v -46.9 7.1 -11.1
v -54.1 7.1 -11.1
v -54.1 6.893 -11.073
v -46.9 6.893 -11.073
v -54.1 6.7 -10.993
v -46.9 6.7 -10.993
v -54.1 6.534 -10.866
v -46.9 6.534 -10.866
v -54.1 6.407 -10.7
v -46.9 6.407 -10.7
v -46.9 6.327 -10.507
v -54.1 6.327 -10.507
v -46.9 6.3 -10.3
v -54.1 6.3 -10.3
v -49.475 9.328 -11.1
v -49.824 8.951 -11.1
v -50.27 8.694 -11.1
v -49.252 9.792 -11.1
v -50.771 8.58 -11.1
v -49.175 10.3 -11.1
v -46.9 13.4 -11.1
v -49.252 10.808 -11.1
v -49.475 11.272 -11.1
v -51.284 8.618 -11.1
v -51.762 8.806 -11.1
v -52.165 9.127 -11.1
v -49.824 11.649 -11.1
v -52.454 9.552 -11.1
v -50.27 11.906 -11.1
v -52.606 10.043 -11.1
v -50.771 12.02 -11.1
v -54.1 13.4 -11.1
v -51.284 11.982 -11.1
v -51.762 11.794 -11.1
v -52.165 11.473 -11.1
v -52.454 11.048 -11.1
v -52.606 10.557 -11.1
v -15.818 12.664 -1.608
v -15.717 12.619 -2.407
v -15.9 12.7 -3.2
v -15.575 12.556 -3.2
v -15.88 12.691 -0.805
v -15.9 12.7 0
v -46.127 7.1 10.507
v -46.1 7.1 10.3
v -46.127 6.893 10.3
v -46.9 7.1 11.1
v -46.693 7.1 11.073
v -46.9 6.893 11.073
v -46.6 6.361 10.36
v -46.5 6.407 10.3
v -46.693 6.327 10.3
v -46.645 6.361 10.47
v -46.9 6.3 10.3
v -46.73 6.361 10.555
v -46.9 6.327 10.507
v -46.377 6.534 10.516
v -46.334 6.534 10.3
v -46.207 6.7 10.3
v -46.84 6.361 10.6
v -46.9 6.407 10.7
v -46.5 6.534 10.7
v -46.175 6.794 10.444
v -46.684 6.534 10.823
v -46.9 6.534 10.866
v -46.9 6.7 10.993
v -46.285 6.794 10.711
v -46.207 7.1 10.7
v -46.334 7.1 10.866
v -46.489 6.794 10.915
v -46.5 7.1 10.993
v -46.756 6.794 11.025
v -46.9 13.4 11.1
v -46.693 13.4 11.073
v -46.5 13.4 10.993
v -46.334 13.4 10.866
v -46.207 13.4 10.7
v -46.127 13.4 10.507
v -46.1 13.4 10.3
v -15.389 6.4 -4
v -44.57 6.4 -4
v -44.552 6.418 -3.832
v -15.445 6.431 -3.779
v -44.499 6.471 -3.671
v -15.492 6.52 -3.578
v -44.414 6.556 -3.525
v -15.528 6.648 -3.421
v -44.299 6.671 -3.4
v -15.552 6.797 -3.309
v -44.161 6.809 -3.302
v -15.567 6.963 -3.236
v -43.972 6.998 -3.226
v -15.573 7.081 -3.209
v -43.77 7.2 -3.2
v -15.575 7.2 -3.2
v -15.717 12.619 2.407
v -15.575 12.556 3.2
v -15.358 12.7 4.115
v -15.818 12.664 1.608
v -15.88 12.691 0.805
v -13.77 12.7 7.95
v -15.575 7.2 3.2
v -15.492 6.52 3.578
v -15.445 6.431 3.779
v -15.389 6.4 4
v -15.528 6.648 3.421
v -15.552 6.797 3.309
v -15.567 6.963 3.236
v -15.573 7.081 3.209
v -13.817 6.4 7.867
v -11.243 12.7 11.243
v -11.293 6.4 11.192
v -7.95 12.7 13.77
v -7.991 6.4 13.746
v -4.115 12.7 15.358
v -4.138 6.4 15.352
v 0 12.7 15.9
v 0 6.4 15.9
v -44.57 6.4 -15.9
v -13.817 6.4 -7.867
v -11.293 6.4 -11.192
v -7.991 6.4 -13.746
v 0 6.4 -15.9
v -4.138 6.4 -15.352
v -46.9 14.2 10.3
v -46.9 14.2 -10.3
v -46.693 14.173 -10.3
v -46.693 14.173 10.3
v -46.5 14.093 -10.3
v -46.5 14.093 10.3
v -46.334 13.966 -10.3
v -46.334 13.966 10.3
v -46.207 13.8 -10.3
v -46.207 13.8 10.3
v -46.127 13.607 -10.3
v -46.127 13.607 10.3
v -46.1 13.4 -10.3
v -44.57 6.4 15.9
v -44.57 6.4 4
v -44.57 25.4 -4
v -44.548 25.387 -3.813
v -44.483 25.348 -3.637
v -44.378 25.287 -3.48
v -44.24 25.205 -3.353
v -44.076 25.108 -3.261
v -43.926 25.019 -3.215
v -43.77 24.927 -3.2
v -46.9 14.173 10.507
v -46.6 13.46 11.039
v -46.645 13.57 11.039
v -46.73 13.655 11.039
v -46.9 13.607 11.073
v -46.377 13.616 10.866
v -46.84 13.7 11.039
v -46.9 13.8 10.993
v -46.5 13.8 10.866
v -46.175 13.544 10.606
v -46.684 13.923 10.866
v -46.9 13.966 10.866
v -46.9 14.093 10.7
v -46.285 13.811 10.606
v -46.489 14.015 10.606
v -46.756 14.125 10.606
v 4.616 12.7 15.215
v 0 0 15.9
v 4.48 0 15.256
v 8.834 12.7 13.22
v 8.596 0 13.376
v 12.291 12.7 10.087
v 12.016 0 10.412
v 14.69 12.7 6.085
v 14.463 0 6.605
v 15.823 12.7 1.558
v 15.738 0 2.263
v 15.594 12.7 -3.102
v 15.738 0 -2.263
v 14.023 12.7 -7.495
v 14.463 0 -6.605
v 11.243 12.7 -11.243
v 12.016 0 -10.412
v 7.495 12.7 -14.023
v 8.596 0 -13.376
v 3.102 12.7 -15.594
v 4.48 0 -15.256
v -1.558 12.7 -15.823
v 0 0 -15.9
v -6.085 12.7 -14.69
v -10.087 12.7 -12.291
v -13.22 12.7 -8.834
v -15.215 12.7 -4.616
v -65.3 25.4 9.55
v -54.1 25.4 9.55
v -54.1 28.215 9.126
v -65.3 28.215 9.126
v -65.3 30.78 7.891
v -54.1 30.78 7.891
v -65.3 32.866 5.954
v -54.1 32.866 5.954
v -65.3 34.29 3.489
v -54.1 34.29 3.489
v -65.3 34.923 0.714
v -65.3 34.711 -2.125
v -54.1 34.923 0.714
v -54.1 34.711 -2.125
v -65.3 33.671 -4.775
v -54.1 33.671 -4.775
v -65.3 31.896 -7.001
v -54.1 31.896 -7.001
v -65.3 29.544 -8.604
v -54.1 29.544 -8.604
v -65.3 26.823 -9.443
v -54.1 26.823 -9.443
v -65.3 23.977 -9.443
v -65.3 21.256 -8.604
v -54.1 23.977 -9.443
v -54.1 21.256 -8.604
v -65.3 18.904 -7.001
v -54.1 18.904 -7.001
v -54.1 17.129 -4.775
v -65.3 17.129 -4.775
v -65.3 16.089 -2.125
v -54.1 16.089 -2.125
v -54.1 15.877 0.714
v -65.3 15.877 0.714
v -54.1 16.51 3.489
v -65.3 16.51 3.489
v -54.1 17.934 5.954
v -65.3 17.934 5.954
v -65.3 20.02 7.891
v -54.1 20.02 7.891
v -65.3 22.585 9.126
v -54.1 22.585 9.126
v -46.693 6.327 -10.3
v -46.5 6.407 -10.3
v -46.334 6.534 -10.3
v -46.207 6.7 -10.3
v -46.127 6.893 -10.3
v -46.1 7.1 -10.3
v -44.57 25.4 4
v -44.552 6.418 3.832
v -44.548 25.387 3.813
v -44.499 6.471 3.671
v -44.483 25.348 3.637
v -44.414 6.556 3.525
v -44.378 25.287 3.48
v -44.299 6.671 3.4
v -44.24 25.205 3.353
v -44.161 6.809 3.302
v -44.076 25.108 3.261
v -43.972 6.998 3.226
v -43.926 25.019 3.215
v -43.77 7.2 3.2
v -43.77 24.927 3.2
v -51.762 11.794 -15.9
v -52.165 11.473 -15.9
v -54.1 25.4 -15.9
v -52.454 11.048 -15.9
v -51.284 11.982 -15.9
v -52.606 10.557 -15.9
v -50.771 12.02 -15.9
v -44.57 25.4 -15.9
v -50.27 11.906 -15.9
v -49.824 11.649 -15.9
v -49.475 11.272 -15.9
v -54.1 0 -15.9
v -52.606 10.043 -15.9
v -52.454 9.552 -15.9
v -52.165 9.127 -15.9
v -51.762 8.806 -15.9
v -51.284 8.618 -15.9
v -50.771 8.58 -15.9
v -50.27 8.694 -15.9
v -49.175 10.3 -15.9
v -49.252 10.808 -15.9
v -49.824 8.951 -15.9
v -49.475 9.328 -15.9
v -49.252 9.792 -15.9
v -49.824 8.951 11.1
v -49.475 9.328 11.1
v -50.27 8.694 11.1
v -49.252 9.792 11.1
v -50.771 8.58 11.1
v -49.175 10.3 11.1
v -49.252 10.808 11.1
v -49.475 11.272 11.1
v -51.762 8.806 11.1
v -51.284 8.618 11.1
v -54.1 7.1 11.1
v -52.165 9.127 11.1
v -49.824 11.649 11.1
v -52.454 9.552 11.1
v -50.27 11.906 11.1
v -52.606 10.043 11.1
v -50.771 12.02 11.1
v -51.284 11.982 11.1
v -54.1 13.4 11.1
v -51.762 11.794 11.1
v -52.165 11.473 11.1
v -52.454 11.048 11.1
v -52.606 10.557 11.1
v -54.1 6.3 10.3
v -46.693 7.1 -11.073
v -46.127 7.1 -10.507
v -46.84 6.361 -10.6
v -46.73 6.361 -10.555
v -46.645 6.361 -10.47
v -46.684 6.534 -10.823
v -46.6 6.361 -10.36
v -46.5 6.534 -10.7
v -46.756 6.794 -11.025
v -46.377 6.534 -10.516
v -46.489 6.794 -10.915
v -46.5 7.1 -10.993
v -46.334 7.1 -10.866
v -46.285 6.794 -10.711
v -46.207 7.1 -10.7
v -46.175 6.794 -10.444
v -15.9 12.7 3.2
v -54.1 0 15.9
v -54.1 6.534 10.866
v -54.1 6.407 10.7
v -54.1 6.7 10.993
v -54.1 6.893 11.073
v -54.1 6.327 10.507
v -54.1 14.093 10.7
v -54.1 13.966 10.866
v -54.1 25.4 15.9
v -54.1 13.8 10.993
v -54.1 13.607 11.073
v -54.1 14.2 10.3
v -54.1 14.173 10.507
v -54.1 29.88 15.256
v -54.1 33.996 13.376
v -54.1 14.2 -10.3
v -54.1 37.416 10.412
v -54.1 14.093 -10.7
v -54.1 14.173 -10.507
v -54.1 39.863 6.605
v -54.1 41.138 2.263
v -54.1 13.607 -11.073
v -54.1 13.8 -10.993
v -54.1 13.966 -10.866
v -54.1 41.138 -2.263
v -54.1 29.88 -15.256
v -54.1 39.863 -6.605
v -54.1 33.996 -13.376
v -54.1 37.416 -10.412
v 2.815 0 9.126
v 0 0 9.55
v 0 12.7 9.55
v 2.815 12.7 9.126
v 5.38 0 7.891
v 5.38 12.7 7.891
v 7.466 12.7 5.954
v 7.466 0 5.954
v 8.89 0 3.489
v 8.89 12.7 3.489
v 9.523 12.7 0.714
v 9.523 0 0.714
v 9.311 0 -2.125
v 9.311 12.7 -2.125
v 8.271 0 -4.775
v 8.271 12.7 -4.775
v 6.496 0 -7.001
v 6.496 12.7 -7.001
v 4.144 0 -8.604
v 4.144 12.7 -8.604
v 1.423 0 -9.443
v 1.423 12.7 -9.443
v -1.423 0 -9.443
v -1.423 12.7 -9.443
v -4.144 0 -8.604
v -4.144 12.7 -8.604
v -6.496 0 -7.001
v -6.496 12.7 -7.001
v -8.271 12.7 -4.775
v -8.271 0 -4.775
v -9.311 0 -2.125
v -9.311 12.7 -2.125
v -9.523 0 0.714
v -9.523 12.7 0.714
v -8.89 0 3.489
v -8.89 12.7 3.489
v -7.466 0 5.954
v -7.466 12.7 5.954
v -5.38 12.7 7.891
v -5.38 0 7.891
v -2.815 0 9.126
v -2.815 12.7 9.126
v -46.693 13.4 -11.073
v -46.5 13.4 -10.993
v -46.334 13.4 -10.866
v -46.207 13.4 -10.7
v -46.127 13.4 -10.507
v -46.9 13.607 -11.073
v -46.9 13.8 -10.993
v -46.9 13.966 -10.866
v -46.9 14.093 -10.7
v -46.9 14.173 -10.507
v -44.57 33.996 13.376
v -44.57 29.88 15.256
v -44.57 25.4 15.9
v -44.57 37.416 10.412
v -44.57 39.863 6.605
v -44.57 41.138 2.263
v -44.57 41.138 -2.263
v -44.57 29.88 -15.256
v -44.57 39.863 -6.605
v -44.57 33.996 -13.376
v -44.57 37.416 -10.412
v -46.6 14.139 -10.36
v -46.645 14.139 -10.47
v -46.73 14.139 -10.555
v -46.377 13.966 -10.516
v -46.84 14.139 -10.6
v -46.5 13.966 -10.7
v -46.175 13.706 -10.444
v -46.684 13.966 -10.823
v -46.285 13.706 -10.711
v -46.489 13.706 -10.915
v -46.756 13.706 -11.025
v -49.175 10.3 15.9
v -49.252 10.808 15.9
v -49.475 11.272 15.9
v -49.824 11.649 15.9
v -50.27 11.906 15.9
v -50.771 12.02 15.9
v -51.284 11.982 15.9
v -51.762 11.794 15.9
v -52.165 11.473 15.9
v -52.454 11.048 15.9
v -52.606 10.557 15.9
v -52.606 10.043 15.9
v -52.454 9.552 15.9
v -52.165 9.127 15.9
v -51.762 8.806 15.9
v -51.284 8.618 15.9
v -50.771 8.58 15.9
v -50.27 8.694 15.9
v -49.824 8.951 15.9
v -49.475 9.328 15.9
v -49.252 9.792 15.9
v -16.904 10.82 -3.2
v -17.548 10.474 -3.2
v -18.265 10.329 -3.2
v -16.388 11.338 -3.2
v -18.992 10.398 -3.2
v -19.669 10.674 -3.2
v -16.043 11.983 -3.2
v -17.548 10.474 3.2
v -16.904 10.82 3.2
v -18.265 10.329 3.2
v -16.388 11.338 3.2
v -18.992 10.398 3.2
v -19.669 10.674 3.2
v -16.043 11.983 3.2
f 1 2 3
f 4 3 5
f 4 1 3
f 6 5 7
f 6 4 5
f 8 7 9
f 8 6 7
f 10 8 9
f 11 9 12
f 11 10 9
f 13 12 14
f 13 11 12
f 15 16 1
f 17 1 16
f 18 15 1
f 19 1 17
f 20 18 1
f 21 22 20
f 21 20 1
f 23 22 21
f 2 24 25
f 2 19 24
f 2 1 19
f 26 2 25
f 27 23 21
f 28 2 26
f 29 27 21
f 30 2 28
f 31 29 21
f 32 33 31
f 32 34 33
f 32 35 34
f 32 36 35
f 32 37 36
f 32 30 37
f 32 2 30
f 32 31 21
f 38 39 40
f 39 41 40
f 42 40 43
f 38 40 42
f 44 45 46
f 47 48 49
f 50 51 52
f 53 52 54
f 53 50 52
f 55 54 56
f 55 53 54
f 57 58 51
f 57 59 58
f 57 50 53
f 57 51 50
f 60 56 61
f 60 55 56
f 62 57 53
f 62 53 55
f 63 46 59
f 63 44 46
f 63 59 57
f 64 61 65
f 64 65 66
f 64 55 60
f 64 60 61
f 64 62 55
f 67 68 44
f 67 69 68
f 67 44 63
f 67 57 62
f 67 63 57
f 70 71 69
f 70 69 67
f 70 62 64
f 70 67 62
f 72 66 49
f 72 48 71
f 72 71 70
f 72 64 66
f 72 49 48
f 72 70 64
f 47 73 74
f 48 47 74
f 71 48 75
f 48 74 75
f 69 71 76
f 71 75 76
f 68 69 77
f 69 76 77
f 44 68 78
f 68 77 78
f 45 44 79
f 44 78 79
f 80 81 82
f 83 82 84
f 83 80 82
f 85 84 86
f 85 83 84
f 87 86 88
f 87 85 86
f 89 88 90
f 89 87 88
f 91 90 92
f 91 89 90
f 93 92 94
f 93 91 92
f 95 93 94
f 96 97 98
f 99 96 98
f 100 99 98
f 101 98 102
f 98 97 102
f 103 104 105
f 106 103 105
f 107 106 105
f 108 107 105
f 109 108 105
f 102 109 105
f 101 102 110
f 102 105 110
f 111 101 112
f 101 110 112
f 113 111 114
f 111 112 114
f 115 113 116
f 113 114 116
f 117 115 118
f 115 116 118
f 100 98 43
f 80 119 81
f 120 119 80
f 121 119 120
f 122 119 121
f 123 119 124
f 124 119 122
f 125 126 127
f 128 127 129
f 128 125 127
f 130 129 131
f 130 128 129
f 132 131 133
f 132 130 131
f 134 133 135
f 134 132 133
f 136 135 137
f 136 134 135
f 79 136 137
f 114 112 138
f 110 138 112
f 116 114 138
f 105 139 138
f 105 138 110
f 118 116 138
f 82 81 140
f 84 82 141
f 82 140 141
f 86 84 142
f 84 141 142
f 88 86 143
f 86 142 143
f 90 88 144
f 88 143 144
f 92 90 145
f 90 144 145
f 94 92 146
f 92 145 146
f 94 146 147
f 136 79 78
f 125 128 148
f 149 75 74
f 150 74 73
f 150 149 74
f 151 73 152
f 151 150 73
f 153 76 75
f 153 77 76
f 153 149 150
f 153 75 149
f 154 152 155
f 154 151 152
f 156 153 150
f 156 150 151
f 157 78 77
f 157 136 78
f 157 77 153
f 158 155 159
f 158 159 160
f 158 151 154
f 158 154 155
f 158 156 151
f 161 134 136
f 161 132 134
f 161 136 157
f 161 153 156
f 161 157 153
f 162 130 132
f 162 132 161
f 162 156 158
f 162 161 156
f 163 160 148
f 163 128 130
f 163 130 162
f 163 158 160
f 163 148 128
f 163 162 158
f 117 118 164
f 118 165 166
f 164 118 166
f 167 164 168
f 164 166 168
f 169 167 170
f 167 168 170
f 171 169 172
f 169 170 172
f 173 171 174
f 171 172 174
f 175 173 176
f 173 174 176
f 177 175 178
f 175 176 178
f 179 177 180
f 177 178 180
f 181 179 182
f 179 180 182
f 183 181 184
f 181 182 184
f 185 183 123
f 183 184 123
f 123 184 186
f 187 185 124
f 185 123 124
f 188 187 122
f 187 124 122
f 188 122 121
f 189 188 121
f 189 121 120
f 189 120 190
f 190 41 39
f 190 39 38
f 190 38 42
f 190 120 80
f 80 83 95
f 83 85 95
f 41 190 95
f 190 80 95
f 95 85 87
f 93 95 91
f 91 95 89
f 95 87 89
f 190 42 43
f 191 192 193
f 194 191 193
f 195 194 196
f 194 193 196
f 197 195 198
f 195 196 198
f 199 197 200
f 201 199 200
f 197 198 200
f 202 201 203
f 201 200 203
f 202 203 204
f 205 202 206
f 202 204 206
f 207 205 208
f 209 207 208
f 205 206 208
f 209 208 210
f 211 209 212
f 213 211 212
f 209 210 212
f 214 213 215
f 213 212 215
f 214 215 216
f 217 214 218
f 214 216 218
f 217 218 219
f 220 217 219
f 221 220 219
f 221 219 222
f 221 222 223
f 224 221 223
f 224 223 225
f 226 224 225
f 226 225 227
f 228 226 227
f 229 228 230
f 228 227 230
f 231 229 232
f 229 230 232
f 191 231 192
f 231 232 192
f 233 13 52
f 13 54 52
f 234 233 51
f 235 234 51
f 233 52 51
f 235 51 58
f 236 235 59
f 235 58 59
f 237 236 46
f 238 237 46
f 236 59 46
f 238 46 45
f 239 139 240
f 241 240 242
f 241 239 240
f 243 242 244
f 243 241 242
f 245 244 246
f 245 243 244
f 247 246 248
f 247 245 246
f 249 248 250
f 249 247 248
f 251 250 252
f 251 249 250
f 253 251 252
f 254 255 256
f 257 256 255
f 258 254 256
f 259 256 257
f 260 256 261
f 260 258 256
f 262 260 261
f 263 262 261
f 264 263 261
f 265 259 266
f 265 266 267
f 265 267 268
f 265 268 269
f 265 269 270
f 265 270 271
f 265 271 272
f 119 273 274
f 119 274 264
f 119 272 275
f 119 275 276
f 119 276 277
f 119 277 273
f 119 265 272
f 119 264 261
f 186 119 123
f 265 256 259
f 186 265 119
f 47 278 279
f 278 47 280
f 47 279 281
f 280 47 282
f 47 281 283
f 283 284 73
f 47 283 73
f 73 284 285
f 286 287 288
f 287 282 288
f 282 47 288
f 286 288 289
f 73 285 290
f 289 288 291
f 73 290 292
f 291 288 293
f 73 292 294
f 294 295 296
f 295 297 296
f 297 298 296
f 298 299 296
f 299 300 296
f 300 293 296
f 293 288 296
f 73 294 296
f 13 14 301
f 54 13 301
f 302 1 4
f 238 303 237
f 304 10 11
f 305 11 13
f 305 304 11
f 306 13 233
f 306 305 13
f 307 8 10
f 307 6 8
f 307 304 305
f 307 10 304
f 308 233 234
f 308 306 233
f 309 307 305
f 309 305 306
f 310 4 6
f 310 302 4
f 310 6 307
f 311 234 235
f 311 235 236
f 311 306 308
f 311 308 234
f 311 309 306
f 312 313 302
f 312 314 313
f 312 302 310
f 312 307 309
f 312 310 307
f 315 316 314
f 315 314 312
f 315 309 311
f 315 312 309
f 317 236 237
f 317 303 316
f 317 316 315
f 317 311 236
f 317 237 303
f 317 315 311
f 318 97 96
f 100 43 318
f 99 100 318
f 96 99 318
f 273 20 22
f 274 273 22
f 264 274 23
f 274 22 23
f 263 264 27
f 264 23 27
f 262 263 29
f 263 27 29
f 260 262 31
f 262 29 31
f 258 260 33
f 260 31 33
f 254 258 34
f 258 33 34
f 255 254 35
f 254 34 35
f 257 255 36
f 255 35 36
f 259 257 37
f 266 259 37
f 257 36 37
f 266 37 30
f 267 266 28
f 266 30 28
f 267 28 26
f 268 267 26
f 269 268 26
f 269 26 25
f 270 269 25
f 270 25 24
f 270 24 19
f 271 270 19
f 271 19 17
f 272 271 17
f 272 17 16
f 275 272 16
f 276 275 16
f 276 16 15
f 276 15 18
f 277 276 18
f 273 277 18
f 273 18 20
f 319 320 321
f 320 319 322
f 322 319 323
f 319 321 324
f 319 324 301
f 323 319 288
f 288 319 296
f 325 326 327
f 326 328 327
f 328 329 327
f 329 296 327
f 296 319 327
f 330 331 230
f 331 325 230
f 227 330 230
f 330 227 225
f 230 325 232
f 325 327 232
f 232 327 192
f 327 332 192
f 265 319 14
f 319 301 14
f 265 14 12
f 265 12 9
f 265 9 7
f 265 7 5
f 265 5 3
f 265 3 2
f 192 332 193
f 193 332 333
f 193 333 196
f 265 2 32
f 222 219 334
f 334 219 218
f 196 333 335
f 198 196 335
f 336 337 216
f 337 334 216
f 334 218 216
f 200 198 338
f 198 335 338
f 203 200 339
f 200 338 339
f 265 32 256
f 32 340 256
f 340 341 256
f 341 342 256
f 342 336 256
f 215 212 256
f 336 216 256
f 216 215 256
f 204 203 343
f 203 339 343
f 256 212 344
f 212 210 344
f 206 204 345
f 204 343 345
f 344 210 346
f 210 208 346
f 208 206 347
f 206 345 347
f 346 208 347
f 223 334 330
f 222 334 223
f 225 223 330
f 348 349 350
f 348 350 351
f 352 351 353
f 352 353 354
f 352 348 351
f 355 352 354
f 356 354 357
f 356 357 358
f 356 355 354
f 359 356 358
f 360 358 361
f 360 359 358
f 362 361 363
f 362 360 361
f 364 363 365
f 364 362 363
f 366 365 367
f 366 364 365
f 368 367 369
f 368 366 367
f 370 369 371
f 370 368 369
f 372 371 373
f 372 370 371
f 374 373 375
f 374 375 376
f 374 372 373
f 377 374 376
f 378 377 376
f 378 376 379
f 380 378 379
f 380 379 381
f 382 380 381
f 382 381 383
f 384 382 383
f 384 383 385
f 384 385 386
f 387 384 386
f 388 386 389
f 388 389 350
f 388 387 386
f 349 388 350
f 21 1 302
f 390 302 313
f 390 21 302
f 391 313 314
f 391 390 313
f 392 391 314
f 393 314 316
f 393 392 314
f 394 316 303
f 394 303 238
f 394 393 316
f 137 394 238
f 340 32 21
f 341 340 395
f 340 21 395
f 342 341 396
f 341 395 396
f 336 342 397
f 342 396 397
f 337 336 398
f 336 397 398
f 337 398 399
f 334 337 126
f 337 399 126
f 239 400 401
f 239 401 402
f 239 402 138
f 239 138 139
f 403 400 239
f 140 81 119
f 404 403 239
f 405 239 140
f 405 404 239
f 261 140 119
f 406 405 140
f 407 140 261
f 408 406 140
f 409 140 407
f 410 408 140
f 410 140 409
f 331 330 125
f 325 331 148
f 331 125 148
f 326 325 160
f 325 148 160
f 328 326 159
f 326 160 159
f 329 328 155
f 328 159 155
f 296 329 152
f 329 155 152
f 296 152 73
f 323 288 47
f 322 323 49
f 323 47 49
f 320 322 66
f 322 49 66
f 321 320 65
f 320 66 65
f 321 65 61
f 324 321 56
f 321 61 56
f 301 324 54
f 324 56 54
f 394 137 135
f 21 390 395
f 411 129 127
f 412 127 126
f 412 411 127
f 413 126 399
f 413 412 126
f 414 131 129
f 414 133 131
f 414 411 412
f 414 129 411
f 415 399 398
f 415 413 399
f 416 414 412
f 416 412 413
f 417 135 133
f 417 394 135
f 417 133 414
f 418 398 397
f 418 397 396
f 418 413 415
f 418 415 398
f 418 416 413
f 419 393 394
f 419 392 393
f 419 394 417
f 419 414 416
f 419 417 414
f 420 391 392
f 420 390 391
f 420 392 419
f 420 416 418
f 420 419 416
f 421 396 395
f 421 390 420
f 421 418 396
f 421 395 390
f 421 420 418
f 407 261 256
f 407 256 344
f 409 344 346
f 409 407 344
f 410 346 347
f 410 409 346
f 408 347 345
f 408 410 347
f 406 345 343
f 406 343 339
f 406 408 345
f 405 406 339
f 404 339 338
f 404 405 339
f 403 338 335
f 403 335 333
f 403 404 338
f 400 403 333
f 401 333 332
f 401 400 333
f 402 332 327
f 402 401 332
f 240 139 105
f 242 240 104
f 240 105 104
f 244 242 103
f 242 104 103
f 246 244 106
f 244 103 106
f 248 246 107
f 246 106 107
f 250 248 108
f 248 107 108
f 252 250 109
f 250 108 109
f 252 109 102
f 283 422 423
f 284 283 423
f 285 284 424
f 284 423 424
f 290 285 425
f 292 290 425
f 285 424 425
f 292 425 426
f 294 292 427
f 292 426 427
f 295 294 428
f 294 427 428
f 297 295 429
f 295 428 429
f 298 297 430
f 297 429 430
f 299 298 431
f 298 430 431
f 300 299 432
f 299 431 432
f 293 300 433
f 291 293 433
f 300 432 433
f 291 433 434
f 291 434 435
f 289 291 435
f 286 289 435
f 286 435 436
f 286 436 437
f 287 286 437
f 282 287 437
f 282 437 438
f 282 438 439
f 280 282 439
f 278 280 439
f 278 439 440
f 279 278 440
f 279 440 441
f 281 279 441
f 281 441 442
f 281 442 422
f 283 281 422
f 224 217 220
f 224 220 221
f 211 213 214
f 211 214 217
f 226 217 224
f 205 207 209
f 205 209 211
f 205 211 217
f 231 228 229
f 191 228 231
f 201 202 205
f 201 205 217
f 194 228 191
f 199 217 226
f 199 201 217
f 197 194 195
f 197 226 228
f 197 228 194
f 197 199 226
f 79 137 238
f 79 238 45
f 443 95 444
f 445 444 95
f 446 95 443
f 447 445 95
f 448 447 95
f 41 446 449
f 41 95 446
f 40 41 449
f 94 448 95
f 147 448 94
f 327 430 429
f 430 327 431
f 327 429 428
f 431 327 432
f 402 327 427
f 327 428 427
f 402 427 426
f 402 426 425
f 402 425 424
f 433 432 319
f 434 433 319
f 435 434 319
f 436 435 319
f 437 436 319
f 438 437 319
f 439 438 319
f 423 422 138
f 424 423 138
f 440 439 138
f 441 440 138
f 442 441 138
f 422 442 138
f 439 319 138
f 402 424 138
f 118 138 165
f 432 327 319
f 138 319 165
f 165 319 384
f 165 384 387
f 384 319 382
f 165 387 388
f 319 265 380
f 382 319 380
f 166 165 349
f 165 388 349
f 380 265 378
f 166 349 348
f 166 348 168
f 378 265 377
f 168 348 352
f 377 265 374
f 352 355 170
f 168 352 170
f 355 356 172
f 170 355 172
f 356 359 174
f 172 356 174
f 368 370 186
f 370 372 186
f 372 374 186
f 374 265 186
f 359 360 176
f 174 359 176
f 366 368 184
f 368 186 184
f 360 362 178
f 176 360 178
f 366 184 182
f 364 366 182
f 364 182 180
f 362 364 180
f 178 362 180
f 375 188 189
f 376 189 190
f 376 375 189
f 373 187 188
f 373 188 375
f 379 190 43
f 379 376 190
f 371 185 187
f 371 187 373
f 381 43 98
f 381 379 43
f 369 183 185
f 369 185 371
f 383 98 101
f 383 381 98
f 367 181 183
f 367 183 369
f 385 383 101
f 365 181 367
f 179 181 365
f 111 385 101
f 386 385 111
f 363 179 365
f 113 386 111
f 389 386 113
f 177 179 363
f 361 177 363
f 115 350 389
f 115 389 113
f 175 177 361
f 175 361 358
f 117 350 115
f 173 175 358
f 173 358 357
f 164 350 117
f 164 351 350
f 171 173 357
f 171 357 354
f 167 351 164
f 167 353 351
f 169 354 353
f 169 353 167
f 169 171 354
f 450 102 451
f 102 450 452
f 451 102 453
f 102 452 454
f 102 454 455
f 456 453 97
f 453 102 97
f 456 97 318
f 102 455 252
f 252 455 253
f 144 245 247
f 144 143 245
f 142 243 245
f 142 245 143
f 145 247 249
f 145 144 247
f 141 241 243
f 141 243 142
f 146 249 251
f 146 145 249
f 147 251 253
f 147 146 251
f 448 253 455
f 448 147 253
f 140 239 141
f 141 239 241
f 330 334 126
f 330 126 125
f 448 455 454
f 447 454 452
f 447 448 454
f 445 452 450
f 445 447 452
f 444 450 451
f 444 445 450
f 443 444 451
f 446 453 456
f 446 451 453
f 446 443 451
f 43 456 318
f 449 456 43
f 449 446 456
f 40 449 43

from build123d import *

# Parameters (mm, degrees)
BOSS_EXTRUDE1_DEPTH     = 6.4
SKETCH1_3_R             = 15.9
SKETCH1_3_R_2           = 9.55
BOSS_EXTRUDE2_DEPTH     = 12.7
SKETCH1_4_W             = 9.53
SKETCH1_4_H             = 31.8
BOSS_EXTRUDE3_DEPTH     = 25.4
RIB1_REACH              = 63.845
SKETCH6_WALL_W          = 157.046570884
SKETCH6_WALL_H          = 6.4
CUT_EXTRUDE1_DEPTH      = 62.844805764
CUT_EXTRUDE1_DEPTH_BACK = 62.844805764
BOSS_EXTRUDE10_DEPTH    = 9.53
SKETCH9_R               = 9.55
BOSS_EXTRUDE11_DEPTH    = 11.2
SKETCH10_W              = 22.2
SKETCH10_H              = 7.9
CUT_EXTRUDE2_DEPTH      = 8
SKETCH11_R              = 1.725
CUT_EXTRUDE3_DEPTH      = 84.552498467
FILLET1_R               = 0.8


with BuildPart() as part:
    # Sketch1 → Boss-Extrude1 (new body)
    with BuildSketch(Plane(origin=(0, 0, 0), x_dir=(1, 0, 0), z_dir=(0, 1, 0))):
        with BuildLine():
            ThreePointArc((0, -15.9), (-15.9, 0), (0, 15.9))
            Line((0, 15.9), (-44.57, 15.9))
            Line((-44.57, 15.9), (-44.57, -15.9))
            Line((-44.57, -15.9), (0, -15.9))
        make_face()
    extrude(amount=BOSS_EXTRUDE1_DEPTH)

    # Sketch1<3> → Boss-Extrude2 (add)
    with BuildSketch(Plane(origin=(0, 0, 0), x_dir=(1, 0, 0), z_dir=(0, 1, 0))):
        with Locations(Location((0, 0, 0), (0, 0, 270))):
            Circle(SKETCH1_3_R)
        with Locations(Location((0, 0, 0), (0, 0, 270))):
            Circle(SKETCH1_3_R_2, mode=Mode.SUBTRACT)
    extrude(amount=BOSS_EXTRUDE2_DEPTH)

    # Sketch1<4> → Boss-Extrude3 (add)
    with BuildSketch(Plane(origin=(0, 0, 0), x_dir=(1, 0, 0), z_dir=(0, 1, 0))):
        with Locations((-49.335, 0)):
            Rectangle(SKETCH1_4_W, SKETCH1_4_H)
    extrude(amount=BOSS_EXTRUDE3_DEPTH)

    # Sketch6 wall → Rib1 (add, up to next)
    with BuildSketch(Plane(origin=(-30.235, 19.05, 0), x_dir=(-0.914310589726, 0.405013759662, 0), z_dir=(-0.405013759662, -0.914310589726, 0)), mode=Mode.PRIVATE) as rib1_sk1:
        Rectangle(SKETCH6_WALL_W, SKETCH6_WALL_H)
    rib1_tool1 = extrude(rib1_sk1.sketch, amount=RIB1_REACH, mode=Mode.PRIVATE) - part.part
    add(rib1_tool1.solids().sort_by_distance((-30.235, 19.05, 0))[0])

    # Sketch7 → Cut-Extrude1 (cut, two sides)
    with BuildSketch(Plane.XY) as cut_extrude1_sk:
        with BuildLine():
            Line((-44.57, 25.4), (-19.669441159, 10.673850552))
            ThreePointArc((-19.669441159, 10.673850552), (-17.213195922, 10.623662856), (-15.9, 12.7))
            Line((-15.9, 12.7), (-44.57, 25.4))
        make_face()
    extrude(amount=CUT_EXTRUDE1_DEPTH, mode=Mode.SUBTRACT)
    extrude(cut_extrude1_sk.sketch, amount=-CUT_EXTRUDE1_DEPTH_BACK, mode=Mode.SUBTRACT)

    # Sketch8 → Boss-Extrude10 (add)
    with BuildSketch(Plane(origin=(-44.57, 0, 0), x_dir=(0, 0, -1), z_dir=(1, 0, 0))):
        with BuildLine():
            Line((-15.9, 25.4), (15.9, 25.4))
            ThreePointArc((15.9, 25.4), (0, 41.3), (-15.9, 25.4))
        make_face()
    extrude(amount=-BOSS_EXTRUDE10_DEPTH)

    # Sketch9 → Boss-Extrude11 (add)
    with BuildSketch(Plane.ZY.offset(54.1)):
        with Locations((0, 25.4)):
            Circle(SKETCH9_R)
    extrude(amount=BOSS_EXTRUDE11_DEPTH)

    # Sketch10 → Cut-Extrude2 (cut)
    with BuildSketch(Plane.ZY.offset(54.1)):
        with Locations((0, 10.25)):
            Rectangle(SKETCH10_W, SKETCH10_H)
    extrude(amount=-CUT_EXTRUDE2_DEPTH, mode=Mode.SUBTRACT)

    # Sketch11 → Cut-Extrude3 (cut, through all)
    with BuildSketch(Plane.XY.offset(15.9)):
        with Locations((-50.9, 10.3)):
            Circle(SKETCH11_R)
    extrude(amount=-CUT_EXTRUDE3_DEPTH, mode=Mode.SUBTRACT)

    # Fillet1
    fillet1_edges = [part.edges().sort_by_distance(p)[0] for p in [
        (-46.1, 10.25, -11.1),
        (-50.1, 6.3, -11.1),
        (-46.1, 14.2, 0),
        (-50.1, 14.2, -11.1),
        (-46.1, 10.25, 11.1),
        (-50.1, 14.2, 11.1),
        (-46.1, 6.3, 0),
        (-50.1, 6.3, 11.1),
        (-44.57, 15.9, 3.2),
        (-30.072329452, 6.4, 3.2),
        (-44.57, 15.9, -3.2),
        (-30.072329452, 6.4, -3.2),
    ]]
    fillet(fillet1_edges, radius=FILLET1_R)


solid = part.part
